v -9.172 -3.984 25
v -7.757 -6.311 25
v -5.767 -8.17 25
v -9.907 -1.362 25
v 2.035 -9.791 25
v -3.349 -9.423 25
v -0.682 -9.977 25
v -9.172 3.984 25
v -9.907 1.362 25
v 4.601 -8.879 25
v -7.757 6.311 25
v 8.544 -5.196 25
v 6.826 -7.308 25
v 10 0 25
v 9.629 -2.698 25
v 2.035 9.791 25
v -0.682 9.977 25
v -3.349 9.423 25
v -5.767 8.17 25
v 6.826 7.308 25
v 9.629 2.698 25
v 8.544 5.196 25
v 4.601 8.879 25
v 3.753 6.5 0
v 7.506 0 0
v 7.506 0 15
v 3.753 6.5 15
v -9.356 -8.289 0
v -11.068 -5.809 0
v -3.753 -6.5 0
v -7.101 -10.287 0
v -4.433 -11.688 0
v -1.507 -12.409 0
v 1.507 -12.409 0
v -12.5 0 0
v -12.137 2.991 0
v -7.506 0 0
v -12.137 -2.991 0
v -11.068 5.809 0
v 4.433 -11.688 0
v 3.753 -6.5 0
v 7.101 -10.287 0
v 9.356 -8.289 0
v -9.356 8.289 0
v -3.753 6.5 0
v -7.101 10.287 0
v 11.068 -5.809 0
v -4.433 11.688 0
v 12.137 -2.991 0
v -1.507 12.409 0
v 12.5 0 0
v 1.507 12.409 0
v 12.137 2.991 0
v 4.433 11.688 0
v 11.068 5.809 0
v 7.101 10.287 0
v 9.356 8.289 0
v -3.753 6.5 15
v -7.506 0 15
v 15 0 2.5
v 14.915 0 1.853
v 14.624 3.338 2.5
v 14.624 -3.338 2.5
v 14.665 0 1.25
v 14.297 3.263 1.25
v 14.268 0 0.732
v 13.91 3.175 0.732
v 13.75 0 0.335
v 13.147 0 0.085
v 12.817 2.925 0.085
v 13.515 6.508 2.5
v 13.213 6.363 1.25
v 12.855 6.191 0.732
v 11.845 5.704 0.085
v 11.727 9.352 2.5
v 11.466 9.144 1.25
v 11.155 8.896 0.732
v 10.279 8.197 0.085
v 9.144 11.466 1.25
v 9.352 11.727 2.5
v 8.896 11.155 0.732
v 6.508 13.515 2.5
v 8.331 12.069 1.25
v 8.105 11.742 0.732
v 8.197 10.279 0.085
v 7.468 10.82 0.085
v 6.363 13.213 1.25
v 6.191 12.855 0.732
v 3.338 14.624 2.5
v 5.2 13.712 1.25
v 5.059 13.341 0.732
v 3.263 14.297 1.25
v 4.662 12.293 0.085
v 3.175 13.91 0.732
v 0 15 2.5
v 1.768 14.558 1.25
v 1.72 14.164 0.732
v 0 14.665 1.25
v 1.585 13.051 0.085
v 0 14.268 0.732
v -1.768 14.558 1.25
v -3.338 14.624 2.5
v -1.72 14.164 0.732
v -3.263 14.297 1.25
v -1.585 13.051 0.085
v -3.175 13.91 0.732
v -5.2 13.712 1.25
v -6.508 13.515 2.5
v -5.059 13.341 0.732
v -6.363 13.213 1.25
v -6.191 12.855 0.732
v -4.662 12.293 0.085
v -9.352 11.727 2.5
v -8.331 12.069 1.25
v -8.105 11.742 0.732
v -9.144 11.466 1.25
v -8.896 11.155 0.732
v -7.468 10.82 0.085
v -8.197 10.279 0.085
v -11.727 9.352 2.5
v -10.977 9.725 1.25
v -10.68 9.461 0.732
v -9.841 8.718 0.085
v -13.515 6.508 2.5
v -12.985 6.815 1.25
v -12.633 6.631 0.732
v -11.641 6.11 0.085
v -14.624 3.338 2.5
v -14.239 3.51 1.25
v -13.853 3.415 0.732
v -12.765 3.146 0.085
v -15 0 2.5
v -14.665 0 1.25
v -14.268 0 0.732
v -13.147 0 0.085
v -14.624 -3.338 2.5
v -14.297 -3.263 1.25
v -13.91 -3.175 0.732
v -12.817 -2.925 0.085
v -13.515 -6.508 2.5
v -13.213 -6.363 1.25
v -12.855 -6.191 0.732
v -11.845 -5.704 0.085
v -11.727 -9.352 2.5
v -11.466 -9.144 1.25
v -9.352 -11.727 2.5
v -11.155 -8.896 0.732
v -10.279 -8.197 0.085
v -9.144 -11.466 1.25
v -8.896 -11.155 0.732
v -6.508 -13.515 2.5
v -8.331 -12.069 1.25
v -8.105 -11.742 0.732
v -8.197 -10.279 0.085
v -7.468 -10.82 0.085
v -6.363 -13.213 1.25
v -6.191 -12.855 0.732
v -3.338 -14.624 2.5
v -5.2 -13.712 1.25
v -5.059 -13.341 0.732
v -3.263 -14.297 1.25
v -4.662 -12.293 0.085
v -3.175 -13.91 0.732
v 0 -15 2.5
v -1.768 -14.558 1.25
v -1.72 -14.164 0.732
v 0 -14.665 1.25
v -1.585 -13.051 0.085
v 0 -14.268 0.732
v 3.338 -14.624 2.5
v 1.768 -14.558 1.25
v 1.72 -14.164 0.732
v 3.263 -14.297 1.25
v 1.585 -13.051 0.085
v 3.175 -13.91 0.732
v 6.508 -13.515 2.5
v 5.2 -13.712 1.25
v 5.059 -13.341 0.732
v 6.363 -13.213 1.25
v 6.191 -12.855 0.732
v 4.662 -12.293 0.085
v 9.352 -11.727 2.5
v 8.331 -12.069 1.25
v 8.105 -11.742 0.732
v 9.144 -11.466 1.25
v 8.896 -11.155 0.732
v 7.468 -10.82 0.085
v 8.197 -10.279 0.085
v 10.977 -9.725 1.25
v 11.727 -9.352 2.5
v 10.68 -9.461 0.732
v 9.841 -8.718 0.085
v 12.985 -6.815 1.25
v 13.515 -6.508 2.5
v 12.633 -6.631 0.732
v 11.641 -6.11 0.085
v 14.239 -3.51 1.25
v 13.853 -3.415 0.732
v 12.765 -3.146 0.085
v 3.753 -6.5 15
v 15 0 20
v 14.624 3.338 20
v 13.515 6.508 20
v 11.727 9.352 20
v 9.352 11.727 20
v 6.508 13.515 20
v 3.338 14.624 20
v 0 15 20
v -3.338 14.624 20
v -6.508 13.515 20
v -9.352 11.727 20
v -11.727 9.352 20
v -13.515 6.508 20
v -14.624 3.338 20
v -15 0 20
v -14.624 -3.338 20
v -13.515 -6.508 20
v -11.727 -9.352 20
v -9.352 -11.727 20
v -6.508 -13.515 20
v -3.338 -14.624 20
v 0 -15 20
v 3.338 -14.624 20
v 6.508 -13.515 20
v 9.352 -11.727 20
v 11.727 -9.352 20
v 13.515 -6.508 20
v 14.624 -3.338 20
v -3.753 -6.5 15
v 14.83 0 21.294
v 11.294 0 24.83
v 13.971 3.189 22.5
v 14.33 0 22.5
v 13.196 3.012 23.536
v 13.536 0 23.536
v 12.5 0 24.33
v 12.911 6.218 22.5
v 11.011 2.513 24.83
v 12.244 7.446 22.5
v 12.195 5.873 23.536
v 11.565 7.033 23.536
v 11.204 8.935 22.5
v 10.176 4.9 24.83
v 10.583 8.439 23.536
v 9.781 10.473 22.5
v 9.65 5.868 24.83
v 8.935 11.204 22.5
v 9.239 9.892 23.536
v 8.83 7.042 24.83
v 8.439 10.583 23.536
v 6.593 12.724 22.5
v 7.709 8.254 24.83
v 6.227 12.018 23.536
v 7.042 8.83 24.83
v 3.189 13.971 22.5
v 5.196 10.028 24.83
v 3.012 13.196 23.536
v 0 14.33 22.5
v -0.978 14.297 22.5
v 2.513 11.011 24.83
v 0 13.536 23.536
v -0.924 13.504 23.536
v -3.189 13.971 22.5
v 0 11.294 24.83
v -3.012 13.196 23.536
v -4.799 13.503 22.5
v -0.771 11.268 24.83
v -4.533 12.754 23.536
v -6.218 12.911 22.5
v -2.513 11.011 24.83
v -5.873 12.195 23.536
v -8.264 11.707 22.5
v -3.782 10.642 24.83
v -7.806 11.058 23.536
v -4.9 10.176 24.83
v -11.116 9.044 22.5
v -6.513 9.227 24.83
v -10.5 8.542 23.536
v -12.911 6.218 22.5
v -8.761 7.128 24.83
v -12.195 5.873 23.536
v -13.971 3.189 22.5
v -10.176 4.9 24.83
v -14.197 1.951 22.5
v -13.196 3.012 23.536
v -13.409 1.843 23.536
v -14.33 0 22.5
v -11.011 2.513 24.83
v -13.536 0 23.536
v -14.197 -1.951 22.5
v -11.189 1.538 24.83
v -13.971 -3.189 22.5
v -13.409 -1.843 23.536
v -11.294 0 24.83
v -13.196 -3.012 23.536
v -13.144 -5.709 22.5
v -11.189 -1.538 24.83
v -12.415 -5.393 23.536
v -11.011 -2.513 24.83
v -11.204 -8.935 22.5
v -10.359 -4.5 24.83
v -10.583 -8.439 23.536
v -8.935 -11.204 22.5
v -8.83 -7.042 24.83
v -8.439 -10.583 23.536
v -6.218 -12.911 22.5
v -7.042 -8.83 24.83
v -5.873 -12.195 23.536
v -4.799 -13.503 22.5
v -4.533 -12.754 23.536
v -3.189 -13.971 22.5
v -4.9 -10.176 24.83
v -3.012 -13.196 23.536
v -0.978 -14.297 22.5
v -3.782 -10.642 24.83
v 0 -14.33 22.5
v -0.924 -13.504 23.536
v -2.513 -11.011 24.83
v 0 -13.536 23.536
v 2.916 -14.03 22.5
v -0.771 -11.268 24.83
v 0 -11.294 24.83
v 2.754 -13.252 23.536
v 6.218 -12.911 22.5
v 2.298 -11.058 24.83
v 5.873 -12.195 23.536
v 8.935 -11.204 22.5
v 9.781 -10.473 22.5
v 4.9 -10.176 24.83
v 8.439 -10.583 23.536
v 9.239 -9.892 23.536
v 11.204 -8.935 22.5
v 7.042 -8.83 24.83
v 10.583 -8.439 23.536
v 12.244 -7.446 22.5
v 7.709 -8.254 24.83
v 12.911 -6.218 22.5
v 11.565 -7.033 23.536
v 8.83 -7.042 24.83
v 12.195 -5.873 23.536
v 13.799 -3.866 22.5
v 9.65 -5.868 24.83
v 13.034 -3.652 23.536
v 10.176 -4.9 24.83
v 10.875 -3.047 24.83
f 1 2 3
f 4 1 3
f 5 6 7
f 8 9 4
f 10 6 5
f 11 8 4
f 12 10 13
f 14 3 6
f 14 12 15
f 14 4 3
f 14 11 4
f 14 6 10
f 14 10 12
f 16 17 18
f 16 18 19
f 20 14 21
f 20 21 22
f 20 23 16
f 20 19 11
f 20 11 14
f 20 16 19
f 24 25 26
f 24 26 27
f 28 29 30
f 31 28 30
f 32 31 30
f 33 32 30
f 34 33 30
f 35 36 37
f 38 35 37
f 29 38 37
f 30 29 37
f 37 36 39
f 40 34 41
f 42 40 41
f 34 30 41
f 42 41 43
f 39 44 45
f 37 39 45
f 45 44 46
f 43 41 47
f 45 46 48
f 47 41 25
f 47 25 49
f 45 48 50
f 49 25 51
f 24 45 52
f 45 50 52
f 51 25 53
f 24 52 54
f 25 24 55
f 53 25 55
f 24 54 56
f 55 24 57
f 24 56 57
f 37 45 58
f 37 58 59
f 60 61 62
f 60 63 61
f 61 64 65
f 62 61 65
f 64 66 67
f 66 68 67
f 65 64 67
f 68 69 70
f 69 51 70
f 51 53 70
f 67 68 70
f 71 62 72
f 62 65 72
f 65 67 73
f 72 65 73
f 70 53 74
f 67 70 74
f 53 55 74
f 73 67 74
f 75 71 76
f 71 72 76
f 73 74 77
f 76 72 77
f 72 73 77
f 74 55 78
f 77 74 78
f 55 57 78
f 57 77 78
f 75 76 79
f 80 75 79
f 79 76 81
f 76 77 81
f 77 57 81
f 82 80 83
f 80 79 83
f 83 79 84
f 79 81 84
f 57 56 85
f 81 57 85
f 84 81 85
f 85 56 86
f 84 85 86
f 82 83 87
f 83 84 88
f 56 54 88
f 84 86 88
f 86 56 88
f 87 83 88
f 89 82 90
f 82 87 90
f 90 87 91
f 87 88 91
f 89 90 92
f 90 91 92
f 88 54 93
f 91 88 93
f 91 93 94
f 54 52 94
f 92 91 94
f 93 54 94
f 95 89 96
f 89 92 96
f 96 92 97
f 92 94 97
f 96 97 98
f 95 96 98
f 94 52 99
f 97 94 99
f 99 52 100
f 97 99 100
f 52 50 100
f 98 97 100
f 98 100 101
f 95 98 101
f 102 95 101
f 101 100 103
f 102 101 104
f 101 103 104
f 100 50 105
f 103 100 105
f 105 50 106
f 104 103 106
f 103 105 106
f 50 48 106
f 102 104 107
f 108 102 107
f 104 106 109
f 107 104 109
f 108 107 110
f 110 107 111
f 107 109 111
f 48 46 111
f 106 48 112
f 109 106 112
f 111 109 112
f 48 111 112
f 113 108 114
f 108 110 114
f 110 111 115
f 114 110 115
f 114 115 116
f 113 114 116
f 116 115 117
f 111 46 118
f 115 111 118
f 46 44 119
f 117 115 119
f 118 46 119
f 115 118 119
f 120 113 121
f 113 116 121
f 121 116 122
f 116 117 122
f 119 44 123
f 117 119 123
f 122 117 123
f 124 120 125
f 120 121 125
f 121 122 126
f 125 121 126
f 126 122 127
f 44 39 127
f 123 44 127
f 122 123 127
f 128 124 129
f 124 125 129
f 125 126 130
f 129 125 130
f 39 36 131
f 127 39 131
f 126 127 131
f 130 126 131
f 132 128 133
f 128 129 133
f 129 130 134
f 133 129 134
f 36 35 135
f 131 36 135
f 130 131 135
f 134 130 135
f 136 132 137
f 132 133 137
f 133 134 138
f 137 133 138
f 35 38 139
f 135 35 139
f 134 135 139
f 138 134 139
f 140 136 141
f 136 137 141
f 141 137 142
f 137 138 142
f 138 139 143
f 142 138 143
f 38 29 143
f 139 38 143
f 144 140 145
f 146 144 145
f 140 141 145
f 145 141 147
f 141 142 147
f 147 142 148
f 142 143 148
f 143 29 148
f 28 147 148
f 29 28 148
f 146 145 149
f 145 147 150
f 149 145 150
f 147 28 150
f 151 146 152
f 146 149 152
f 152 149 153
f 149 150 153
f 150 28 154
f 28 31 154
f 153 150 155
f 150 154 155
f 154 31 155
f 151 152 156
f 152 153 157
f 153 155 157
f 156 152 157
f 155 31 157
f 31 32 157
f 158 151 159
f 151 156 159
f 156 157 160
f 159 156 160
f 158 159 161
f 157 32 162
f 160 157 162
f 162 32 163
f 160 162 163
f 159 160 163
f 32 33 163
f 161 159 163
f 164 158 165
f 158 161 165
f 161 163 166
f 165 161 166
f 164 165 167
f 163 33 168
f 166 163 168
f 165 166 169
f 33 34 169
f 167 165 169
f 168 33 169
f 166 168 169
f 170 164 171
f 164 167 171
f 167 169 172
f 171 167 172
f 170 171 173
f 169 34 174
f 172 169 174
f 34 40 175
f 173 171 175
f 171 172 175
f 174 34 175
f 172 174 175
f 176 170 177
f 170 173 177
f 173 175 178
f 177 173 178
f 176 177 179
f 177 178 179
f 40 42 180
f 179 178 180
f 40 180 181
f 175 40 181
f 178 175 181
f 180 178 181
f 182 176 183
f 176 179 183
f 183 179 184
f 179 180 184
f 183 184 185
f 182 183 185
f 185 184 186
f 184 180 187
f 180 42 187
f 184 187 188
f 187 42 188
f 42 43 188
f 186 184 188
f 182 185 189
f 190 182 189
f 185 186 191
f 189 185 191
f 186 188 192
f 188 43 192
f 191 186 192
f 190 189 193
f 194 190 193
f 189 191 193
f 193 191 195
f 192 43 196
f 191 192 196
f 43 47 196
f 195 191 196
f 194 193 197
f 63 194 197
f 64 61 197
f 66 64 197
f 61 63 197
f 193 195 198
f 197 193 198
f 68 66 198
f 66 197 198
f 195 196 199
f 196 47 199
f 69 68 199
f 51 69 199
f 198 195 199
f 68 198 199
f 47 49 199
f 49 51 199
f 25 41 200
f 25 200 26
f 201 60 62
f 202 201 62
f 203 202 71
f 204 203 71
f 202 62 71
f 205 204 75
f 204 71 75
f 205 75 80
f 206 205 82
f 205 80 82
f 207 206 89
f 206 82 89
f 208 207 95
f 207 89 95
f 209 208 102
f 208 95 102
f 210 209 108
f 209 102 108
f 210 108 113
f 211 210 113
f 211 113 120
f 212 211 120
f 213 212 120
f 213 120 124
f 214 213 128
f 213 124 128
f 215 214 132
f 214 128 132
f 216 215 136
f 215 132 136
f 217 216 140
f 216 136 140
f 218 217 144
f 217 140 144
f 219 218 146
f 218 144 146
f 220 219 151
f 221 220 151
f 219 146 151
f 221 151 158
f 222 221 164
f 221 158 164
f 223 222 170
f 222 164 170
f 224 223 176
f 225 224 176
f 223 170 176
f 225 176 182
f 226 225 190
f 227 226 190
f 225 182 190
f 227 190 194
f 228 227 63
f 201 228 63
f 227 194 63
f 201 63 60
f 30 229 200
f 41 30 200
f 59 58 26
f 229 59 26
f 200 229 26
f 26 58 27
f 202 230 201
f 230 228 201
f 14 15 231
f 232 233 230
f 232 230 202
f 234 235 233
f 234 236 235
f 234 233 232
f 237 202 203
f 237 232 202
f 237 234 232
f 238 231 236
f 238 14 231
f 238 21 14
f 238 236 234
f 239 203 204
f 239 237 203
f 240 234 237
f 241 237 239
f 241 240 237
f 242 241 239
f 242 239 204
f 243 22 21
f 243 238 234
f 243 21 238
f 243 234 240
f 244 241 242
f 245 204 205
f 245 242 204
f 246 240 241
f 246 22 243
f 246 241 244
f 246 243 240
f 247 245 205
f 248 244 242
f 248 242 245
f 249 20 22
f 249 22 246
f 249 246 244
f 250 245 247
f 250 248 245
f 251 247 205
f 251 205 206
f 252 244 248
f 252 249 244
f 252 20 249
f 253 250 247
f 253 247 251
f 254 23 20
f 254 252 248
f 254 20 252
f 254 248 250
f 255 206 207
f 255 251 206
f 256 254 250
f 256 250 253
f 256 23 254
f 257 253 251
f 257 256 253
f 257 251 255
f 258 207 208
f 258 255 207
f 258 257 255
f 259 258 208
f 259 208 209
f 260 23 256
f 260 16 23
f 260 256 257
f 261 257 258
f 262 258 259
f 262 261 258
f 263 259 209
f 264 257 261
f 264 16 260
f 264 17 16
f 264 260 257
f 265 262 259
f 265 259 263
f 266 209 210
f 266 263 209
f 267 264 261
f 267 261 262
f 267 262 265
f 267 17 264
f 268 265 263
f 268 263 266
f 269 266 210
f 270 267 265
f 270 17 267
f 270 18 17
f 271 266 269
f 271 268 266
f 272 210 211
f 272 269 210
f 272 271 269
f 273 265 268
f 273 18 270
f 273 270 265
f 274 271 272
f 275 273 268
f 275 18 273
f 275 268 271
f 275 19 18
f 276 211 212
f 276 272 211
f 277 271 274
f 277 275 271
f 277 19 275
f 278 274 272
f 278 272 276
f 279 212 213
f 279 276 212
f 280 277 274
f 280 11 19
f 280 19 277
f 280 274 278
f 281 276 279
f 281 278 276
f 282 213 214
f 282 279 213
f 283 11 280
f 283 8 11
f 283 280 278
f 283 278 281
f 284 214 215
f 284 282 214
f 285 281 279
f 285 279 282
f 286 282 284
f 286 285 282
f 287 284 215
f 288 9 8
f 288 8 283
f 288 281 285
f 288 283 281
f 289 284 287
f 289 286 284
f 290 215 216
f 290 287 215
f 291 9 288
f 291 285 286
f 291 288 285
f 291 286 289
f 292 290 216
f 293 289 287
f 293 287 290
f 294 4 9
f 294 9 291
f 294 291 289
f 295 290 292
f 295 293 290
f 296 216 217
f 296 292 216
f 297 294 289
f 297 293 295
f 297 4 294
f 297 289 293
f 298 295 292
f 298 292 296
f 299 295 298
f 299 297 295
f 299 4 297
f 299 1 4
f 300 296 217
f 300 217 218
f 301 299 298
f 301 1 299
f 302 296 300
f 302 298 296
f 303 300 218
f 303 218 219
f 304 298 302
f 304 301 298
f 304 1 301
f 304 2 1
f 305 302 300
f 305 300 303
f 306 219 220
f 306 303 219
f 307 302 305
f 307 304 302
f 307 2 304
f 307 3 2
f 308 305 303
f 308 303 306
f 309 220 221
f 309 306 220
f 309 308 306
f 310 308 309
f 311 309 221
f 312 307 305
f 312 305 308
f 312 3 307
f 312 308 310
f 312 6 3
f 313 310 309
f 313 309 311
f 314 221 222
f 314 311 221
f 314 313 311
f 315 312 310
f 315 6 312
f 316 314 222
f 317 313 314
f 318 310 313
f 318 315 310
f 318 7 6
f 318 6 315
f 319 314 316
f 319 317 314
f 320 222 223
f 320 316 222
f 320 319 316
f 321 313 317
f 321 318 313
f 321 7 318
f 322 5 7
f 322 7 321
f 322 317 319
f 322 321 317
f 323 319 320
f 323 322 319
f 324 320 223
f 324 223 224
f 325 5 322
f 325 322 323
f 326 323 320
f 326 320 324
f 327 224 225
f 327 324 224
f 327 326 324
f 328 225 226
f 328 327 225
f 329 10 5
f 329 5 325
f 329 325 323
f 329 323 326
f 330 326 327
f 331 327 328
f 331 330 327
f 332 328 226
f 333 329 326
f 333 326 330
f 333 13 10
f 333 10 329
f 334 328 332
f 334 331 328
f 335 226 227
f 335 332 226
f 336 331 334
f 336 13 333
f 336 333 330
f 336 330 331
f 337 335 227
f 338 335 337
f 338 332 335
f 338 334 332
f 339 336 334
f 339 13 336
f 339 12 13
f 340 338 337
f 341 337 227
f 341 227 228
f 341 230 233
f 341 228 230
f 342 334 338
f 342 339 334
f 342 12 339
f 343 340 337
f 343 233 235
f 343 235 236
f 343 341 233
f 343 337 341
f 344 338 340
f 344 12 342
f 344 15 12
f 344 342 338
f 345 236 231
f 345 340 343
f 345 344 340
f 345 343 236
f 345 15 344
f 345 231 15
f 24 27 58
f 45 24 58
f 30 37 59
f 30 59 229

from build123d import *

# Parameters (mm, degrees)
F0_R     = 15
F1_DEPTH = 25
F2_R     = 5
F3_R     = 2.5
F4_DEPTH = 15


with BuildPart() as f1:
    # F0 (on Top) → F1 (new body)
    with BuildSketch(Plane.XY):
        Circle(F0_R)
        Polygon((-7.505553, 0), (-3.752777, 6.5), (3.752777, 6.5), (7.505553, 0), (3.752777, -6.5), (-3.752777, -6.5), align=None, mode=Mode.SUBTRACT)
        Polygon((3.752777, 6.5), (-3.752777, 6.5), (-7.505553, 0), (-3.752777, -6.5), (3.752777, -6.5), (7.505553, 0), align=None)
    extrude(amount=F1_DEPTH)

    # F2
    f2_edges = [f1.edges().sort_by_distance(p)[0] for p in [
        (-15, 0, 25),
    ]]
    fillet(f2_edges, radius=F2_R)

    # F3
    f3_edges = [f1.edges().sort_by_distance(p)[0] for p in [
        (-15, 0, 0),
    ]]
    fillet(f3_edges, radius=F3_R)

    # F0 (on Top) → F4 (cut)
    with BuildSketch(Plane.XY):
        Polygon((3.752777, 6.5), (-3.752777, 6.5), (-7.505553, 0), (-3.752777, -6.5), (3.752777, -6.5), (7.505553, 0), align=None)
    extrude(amount=F4_DEPTH, mode=Mode.SUBTRACT)


solid = f1.part
